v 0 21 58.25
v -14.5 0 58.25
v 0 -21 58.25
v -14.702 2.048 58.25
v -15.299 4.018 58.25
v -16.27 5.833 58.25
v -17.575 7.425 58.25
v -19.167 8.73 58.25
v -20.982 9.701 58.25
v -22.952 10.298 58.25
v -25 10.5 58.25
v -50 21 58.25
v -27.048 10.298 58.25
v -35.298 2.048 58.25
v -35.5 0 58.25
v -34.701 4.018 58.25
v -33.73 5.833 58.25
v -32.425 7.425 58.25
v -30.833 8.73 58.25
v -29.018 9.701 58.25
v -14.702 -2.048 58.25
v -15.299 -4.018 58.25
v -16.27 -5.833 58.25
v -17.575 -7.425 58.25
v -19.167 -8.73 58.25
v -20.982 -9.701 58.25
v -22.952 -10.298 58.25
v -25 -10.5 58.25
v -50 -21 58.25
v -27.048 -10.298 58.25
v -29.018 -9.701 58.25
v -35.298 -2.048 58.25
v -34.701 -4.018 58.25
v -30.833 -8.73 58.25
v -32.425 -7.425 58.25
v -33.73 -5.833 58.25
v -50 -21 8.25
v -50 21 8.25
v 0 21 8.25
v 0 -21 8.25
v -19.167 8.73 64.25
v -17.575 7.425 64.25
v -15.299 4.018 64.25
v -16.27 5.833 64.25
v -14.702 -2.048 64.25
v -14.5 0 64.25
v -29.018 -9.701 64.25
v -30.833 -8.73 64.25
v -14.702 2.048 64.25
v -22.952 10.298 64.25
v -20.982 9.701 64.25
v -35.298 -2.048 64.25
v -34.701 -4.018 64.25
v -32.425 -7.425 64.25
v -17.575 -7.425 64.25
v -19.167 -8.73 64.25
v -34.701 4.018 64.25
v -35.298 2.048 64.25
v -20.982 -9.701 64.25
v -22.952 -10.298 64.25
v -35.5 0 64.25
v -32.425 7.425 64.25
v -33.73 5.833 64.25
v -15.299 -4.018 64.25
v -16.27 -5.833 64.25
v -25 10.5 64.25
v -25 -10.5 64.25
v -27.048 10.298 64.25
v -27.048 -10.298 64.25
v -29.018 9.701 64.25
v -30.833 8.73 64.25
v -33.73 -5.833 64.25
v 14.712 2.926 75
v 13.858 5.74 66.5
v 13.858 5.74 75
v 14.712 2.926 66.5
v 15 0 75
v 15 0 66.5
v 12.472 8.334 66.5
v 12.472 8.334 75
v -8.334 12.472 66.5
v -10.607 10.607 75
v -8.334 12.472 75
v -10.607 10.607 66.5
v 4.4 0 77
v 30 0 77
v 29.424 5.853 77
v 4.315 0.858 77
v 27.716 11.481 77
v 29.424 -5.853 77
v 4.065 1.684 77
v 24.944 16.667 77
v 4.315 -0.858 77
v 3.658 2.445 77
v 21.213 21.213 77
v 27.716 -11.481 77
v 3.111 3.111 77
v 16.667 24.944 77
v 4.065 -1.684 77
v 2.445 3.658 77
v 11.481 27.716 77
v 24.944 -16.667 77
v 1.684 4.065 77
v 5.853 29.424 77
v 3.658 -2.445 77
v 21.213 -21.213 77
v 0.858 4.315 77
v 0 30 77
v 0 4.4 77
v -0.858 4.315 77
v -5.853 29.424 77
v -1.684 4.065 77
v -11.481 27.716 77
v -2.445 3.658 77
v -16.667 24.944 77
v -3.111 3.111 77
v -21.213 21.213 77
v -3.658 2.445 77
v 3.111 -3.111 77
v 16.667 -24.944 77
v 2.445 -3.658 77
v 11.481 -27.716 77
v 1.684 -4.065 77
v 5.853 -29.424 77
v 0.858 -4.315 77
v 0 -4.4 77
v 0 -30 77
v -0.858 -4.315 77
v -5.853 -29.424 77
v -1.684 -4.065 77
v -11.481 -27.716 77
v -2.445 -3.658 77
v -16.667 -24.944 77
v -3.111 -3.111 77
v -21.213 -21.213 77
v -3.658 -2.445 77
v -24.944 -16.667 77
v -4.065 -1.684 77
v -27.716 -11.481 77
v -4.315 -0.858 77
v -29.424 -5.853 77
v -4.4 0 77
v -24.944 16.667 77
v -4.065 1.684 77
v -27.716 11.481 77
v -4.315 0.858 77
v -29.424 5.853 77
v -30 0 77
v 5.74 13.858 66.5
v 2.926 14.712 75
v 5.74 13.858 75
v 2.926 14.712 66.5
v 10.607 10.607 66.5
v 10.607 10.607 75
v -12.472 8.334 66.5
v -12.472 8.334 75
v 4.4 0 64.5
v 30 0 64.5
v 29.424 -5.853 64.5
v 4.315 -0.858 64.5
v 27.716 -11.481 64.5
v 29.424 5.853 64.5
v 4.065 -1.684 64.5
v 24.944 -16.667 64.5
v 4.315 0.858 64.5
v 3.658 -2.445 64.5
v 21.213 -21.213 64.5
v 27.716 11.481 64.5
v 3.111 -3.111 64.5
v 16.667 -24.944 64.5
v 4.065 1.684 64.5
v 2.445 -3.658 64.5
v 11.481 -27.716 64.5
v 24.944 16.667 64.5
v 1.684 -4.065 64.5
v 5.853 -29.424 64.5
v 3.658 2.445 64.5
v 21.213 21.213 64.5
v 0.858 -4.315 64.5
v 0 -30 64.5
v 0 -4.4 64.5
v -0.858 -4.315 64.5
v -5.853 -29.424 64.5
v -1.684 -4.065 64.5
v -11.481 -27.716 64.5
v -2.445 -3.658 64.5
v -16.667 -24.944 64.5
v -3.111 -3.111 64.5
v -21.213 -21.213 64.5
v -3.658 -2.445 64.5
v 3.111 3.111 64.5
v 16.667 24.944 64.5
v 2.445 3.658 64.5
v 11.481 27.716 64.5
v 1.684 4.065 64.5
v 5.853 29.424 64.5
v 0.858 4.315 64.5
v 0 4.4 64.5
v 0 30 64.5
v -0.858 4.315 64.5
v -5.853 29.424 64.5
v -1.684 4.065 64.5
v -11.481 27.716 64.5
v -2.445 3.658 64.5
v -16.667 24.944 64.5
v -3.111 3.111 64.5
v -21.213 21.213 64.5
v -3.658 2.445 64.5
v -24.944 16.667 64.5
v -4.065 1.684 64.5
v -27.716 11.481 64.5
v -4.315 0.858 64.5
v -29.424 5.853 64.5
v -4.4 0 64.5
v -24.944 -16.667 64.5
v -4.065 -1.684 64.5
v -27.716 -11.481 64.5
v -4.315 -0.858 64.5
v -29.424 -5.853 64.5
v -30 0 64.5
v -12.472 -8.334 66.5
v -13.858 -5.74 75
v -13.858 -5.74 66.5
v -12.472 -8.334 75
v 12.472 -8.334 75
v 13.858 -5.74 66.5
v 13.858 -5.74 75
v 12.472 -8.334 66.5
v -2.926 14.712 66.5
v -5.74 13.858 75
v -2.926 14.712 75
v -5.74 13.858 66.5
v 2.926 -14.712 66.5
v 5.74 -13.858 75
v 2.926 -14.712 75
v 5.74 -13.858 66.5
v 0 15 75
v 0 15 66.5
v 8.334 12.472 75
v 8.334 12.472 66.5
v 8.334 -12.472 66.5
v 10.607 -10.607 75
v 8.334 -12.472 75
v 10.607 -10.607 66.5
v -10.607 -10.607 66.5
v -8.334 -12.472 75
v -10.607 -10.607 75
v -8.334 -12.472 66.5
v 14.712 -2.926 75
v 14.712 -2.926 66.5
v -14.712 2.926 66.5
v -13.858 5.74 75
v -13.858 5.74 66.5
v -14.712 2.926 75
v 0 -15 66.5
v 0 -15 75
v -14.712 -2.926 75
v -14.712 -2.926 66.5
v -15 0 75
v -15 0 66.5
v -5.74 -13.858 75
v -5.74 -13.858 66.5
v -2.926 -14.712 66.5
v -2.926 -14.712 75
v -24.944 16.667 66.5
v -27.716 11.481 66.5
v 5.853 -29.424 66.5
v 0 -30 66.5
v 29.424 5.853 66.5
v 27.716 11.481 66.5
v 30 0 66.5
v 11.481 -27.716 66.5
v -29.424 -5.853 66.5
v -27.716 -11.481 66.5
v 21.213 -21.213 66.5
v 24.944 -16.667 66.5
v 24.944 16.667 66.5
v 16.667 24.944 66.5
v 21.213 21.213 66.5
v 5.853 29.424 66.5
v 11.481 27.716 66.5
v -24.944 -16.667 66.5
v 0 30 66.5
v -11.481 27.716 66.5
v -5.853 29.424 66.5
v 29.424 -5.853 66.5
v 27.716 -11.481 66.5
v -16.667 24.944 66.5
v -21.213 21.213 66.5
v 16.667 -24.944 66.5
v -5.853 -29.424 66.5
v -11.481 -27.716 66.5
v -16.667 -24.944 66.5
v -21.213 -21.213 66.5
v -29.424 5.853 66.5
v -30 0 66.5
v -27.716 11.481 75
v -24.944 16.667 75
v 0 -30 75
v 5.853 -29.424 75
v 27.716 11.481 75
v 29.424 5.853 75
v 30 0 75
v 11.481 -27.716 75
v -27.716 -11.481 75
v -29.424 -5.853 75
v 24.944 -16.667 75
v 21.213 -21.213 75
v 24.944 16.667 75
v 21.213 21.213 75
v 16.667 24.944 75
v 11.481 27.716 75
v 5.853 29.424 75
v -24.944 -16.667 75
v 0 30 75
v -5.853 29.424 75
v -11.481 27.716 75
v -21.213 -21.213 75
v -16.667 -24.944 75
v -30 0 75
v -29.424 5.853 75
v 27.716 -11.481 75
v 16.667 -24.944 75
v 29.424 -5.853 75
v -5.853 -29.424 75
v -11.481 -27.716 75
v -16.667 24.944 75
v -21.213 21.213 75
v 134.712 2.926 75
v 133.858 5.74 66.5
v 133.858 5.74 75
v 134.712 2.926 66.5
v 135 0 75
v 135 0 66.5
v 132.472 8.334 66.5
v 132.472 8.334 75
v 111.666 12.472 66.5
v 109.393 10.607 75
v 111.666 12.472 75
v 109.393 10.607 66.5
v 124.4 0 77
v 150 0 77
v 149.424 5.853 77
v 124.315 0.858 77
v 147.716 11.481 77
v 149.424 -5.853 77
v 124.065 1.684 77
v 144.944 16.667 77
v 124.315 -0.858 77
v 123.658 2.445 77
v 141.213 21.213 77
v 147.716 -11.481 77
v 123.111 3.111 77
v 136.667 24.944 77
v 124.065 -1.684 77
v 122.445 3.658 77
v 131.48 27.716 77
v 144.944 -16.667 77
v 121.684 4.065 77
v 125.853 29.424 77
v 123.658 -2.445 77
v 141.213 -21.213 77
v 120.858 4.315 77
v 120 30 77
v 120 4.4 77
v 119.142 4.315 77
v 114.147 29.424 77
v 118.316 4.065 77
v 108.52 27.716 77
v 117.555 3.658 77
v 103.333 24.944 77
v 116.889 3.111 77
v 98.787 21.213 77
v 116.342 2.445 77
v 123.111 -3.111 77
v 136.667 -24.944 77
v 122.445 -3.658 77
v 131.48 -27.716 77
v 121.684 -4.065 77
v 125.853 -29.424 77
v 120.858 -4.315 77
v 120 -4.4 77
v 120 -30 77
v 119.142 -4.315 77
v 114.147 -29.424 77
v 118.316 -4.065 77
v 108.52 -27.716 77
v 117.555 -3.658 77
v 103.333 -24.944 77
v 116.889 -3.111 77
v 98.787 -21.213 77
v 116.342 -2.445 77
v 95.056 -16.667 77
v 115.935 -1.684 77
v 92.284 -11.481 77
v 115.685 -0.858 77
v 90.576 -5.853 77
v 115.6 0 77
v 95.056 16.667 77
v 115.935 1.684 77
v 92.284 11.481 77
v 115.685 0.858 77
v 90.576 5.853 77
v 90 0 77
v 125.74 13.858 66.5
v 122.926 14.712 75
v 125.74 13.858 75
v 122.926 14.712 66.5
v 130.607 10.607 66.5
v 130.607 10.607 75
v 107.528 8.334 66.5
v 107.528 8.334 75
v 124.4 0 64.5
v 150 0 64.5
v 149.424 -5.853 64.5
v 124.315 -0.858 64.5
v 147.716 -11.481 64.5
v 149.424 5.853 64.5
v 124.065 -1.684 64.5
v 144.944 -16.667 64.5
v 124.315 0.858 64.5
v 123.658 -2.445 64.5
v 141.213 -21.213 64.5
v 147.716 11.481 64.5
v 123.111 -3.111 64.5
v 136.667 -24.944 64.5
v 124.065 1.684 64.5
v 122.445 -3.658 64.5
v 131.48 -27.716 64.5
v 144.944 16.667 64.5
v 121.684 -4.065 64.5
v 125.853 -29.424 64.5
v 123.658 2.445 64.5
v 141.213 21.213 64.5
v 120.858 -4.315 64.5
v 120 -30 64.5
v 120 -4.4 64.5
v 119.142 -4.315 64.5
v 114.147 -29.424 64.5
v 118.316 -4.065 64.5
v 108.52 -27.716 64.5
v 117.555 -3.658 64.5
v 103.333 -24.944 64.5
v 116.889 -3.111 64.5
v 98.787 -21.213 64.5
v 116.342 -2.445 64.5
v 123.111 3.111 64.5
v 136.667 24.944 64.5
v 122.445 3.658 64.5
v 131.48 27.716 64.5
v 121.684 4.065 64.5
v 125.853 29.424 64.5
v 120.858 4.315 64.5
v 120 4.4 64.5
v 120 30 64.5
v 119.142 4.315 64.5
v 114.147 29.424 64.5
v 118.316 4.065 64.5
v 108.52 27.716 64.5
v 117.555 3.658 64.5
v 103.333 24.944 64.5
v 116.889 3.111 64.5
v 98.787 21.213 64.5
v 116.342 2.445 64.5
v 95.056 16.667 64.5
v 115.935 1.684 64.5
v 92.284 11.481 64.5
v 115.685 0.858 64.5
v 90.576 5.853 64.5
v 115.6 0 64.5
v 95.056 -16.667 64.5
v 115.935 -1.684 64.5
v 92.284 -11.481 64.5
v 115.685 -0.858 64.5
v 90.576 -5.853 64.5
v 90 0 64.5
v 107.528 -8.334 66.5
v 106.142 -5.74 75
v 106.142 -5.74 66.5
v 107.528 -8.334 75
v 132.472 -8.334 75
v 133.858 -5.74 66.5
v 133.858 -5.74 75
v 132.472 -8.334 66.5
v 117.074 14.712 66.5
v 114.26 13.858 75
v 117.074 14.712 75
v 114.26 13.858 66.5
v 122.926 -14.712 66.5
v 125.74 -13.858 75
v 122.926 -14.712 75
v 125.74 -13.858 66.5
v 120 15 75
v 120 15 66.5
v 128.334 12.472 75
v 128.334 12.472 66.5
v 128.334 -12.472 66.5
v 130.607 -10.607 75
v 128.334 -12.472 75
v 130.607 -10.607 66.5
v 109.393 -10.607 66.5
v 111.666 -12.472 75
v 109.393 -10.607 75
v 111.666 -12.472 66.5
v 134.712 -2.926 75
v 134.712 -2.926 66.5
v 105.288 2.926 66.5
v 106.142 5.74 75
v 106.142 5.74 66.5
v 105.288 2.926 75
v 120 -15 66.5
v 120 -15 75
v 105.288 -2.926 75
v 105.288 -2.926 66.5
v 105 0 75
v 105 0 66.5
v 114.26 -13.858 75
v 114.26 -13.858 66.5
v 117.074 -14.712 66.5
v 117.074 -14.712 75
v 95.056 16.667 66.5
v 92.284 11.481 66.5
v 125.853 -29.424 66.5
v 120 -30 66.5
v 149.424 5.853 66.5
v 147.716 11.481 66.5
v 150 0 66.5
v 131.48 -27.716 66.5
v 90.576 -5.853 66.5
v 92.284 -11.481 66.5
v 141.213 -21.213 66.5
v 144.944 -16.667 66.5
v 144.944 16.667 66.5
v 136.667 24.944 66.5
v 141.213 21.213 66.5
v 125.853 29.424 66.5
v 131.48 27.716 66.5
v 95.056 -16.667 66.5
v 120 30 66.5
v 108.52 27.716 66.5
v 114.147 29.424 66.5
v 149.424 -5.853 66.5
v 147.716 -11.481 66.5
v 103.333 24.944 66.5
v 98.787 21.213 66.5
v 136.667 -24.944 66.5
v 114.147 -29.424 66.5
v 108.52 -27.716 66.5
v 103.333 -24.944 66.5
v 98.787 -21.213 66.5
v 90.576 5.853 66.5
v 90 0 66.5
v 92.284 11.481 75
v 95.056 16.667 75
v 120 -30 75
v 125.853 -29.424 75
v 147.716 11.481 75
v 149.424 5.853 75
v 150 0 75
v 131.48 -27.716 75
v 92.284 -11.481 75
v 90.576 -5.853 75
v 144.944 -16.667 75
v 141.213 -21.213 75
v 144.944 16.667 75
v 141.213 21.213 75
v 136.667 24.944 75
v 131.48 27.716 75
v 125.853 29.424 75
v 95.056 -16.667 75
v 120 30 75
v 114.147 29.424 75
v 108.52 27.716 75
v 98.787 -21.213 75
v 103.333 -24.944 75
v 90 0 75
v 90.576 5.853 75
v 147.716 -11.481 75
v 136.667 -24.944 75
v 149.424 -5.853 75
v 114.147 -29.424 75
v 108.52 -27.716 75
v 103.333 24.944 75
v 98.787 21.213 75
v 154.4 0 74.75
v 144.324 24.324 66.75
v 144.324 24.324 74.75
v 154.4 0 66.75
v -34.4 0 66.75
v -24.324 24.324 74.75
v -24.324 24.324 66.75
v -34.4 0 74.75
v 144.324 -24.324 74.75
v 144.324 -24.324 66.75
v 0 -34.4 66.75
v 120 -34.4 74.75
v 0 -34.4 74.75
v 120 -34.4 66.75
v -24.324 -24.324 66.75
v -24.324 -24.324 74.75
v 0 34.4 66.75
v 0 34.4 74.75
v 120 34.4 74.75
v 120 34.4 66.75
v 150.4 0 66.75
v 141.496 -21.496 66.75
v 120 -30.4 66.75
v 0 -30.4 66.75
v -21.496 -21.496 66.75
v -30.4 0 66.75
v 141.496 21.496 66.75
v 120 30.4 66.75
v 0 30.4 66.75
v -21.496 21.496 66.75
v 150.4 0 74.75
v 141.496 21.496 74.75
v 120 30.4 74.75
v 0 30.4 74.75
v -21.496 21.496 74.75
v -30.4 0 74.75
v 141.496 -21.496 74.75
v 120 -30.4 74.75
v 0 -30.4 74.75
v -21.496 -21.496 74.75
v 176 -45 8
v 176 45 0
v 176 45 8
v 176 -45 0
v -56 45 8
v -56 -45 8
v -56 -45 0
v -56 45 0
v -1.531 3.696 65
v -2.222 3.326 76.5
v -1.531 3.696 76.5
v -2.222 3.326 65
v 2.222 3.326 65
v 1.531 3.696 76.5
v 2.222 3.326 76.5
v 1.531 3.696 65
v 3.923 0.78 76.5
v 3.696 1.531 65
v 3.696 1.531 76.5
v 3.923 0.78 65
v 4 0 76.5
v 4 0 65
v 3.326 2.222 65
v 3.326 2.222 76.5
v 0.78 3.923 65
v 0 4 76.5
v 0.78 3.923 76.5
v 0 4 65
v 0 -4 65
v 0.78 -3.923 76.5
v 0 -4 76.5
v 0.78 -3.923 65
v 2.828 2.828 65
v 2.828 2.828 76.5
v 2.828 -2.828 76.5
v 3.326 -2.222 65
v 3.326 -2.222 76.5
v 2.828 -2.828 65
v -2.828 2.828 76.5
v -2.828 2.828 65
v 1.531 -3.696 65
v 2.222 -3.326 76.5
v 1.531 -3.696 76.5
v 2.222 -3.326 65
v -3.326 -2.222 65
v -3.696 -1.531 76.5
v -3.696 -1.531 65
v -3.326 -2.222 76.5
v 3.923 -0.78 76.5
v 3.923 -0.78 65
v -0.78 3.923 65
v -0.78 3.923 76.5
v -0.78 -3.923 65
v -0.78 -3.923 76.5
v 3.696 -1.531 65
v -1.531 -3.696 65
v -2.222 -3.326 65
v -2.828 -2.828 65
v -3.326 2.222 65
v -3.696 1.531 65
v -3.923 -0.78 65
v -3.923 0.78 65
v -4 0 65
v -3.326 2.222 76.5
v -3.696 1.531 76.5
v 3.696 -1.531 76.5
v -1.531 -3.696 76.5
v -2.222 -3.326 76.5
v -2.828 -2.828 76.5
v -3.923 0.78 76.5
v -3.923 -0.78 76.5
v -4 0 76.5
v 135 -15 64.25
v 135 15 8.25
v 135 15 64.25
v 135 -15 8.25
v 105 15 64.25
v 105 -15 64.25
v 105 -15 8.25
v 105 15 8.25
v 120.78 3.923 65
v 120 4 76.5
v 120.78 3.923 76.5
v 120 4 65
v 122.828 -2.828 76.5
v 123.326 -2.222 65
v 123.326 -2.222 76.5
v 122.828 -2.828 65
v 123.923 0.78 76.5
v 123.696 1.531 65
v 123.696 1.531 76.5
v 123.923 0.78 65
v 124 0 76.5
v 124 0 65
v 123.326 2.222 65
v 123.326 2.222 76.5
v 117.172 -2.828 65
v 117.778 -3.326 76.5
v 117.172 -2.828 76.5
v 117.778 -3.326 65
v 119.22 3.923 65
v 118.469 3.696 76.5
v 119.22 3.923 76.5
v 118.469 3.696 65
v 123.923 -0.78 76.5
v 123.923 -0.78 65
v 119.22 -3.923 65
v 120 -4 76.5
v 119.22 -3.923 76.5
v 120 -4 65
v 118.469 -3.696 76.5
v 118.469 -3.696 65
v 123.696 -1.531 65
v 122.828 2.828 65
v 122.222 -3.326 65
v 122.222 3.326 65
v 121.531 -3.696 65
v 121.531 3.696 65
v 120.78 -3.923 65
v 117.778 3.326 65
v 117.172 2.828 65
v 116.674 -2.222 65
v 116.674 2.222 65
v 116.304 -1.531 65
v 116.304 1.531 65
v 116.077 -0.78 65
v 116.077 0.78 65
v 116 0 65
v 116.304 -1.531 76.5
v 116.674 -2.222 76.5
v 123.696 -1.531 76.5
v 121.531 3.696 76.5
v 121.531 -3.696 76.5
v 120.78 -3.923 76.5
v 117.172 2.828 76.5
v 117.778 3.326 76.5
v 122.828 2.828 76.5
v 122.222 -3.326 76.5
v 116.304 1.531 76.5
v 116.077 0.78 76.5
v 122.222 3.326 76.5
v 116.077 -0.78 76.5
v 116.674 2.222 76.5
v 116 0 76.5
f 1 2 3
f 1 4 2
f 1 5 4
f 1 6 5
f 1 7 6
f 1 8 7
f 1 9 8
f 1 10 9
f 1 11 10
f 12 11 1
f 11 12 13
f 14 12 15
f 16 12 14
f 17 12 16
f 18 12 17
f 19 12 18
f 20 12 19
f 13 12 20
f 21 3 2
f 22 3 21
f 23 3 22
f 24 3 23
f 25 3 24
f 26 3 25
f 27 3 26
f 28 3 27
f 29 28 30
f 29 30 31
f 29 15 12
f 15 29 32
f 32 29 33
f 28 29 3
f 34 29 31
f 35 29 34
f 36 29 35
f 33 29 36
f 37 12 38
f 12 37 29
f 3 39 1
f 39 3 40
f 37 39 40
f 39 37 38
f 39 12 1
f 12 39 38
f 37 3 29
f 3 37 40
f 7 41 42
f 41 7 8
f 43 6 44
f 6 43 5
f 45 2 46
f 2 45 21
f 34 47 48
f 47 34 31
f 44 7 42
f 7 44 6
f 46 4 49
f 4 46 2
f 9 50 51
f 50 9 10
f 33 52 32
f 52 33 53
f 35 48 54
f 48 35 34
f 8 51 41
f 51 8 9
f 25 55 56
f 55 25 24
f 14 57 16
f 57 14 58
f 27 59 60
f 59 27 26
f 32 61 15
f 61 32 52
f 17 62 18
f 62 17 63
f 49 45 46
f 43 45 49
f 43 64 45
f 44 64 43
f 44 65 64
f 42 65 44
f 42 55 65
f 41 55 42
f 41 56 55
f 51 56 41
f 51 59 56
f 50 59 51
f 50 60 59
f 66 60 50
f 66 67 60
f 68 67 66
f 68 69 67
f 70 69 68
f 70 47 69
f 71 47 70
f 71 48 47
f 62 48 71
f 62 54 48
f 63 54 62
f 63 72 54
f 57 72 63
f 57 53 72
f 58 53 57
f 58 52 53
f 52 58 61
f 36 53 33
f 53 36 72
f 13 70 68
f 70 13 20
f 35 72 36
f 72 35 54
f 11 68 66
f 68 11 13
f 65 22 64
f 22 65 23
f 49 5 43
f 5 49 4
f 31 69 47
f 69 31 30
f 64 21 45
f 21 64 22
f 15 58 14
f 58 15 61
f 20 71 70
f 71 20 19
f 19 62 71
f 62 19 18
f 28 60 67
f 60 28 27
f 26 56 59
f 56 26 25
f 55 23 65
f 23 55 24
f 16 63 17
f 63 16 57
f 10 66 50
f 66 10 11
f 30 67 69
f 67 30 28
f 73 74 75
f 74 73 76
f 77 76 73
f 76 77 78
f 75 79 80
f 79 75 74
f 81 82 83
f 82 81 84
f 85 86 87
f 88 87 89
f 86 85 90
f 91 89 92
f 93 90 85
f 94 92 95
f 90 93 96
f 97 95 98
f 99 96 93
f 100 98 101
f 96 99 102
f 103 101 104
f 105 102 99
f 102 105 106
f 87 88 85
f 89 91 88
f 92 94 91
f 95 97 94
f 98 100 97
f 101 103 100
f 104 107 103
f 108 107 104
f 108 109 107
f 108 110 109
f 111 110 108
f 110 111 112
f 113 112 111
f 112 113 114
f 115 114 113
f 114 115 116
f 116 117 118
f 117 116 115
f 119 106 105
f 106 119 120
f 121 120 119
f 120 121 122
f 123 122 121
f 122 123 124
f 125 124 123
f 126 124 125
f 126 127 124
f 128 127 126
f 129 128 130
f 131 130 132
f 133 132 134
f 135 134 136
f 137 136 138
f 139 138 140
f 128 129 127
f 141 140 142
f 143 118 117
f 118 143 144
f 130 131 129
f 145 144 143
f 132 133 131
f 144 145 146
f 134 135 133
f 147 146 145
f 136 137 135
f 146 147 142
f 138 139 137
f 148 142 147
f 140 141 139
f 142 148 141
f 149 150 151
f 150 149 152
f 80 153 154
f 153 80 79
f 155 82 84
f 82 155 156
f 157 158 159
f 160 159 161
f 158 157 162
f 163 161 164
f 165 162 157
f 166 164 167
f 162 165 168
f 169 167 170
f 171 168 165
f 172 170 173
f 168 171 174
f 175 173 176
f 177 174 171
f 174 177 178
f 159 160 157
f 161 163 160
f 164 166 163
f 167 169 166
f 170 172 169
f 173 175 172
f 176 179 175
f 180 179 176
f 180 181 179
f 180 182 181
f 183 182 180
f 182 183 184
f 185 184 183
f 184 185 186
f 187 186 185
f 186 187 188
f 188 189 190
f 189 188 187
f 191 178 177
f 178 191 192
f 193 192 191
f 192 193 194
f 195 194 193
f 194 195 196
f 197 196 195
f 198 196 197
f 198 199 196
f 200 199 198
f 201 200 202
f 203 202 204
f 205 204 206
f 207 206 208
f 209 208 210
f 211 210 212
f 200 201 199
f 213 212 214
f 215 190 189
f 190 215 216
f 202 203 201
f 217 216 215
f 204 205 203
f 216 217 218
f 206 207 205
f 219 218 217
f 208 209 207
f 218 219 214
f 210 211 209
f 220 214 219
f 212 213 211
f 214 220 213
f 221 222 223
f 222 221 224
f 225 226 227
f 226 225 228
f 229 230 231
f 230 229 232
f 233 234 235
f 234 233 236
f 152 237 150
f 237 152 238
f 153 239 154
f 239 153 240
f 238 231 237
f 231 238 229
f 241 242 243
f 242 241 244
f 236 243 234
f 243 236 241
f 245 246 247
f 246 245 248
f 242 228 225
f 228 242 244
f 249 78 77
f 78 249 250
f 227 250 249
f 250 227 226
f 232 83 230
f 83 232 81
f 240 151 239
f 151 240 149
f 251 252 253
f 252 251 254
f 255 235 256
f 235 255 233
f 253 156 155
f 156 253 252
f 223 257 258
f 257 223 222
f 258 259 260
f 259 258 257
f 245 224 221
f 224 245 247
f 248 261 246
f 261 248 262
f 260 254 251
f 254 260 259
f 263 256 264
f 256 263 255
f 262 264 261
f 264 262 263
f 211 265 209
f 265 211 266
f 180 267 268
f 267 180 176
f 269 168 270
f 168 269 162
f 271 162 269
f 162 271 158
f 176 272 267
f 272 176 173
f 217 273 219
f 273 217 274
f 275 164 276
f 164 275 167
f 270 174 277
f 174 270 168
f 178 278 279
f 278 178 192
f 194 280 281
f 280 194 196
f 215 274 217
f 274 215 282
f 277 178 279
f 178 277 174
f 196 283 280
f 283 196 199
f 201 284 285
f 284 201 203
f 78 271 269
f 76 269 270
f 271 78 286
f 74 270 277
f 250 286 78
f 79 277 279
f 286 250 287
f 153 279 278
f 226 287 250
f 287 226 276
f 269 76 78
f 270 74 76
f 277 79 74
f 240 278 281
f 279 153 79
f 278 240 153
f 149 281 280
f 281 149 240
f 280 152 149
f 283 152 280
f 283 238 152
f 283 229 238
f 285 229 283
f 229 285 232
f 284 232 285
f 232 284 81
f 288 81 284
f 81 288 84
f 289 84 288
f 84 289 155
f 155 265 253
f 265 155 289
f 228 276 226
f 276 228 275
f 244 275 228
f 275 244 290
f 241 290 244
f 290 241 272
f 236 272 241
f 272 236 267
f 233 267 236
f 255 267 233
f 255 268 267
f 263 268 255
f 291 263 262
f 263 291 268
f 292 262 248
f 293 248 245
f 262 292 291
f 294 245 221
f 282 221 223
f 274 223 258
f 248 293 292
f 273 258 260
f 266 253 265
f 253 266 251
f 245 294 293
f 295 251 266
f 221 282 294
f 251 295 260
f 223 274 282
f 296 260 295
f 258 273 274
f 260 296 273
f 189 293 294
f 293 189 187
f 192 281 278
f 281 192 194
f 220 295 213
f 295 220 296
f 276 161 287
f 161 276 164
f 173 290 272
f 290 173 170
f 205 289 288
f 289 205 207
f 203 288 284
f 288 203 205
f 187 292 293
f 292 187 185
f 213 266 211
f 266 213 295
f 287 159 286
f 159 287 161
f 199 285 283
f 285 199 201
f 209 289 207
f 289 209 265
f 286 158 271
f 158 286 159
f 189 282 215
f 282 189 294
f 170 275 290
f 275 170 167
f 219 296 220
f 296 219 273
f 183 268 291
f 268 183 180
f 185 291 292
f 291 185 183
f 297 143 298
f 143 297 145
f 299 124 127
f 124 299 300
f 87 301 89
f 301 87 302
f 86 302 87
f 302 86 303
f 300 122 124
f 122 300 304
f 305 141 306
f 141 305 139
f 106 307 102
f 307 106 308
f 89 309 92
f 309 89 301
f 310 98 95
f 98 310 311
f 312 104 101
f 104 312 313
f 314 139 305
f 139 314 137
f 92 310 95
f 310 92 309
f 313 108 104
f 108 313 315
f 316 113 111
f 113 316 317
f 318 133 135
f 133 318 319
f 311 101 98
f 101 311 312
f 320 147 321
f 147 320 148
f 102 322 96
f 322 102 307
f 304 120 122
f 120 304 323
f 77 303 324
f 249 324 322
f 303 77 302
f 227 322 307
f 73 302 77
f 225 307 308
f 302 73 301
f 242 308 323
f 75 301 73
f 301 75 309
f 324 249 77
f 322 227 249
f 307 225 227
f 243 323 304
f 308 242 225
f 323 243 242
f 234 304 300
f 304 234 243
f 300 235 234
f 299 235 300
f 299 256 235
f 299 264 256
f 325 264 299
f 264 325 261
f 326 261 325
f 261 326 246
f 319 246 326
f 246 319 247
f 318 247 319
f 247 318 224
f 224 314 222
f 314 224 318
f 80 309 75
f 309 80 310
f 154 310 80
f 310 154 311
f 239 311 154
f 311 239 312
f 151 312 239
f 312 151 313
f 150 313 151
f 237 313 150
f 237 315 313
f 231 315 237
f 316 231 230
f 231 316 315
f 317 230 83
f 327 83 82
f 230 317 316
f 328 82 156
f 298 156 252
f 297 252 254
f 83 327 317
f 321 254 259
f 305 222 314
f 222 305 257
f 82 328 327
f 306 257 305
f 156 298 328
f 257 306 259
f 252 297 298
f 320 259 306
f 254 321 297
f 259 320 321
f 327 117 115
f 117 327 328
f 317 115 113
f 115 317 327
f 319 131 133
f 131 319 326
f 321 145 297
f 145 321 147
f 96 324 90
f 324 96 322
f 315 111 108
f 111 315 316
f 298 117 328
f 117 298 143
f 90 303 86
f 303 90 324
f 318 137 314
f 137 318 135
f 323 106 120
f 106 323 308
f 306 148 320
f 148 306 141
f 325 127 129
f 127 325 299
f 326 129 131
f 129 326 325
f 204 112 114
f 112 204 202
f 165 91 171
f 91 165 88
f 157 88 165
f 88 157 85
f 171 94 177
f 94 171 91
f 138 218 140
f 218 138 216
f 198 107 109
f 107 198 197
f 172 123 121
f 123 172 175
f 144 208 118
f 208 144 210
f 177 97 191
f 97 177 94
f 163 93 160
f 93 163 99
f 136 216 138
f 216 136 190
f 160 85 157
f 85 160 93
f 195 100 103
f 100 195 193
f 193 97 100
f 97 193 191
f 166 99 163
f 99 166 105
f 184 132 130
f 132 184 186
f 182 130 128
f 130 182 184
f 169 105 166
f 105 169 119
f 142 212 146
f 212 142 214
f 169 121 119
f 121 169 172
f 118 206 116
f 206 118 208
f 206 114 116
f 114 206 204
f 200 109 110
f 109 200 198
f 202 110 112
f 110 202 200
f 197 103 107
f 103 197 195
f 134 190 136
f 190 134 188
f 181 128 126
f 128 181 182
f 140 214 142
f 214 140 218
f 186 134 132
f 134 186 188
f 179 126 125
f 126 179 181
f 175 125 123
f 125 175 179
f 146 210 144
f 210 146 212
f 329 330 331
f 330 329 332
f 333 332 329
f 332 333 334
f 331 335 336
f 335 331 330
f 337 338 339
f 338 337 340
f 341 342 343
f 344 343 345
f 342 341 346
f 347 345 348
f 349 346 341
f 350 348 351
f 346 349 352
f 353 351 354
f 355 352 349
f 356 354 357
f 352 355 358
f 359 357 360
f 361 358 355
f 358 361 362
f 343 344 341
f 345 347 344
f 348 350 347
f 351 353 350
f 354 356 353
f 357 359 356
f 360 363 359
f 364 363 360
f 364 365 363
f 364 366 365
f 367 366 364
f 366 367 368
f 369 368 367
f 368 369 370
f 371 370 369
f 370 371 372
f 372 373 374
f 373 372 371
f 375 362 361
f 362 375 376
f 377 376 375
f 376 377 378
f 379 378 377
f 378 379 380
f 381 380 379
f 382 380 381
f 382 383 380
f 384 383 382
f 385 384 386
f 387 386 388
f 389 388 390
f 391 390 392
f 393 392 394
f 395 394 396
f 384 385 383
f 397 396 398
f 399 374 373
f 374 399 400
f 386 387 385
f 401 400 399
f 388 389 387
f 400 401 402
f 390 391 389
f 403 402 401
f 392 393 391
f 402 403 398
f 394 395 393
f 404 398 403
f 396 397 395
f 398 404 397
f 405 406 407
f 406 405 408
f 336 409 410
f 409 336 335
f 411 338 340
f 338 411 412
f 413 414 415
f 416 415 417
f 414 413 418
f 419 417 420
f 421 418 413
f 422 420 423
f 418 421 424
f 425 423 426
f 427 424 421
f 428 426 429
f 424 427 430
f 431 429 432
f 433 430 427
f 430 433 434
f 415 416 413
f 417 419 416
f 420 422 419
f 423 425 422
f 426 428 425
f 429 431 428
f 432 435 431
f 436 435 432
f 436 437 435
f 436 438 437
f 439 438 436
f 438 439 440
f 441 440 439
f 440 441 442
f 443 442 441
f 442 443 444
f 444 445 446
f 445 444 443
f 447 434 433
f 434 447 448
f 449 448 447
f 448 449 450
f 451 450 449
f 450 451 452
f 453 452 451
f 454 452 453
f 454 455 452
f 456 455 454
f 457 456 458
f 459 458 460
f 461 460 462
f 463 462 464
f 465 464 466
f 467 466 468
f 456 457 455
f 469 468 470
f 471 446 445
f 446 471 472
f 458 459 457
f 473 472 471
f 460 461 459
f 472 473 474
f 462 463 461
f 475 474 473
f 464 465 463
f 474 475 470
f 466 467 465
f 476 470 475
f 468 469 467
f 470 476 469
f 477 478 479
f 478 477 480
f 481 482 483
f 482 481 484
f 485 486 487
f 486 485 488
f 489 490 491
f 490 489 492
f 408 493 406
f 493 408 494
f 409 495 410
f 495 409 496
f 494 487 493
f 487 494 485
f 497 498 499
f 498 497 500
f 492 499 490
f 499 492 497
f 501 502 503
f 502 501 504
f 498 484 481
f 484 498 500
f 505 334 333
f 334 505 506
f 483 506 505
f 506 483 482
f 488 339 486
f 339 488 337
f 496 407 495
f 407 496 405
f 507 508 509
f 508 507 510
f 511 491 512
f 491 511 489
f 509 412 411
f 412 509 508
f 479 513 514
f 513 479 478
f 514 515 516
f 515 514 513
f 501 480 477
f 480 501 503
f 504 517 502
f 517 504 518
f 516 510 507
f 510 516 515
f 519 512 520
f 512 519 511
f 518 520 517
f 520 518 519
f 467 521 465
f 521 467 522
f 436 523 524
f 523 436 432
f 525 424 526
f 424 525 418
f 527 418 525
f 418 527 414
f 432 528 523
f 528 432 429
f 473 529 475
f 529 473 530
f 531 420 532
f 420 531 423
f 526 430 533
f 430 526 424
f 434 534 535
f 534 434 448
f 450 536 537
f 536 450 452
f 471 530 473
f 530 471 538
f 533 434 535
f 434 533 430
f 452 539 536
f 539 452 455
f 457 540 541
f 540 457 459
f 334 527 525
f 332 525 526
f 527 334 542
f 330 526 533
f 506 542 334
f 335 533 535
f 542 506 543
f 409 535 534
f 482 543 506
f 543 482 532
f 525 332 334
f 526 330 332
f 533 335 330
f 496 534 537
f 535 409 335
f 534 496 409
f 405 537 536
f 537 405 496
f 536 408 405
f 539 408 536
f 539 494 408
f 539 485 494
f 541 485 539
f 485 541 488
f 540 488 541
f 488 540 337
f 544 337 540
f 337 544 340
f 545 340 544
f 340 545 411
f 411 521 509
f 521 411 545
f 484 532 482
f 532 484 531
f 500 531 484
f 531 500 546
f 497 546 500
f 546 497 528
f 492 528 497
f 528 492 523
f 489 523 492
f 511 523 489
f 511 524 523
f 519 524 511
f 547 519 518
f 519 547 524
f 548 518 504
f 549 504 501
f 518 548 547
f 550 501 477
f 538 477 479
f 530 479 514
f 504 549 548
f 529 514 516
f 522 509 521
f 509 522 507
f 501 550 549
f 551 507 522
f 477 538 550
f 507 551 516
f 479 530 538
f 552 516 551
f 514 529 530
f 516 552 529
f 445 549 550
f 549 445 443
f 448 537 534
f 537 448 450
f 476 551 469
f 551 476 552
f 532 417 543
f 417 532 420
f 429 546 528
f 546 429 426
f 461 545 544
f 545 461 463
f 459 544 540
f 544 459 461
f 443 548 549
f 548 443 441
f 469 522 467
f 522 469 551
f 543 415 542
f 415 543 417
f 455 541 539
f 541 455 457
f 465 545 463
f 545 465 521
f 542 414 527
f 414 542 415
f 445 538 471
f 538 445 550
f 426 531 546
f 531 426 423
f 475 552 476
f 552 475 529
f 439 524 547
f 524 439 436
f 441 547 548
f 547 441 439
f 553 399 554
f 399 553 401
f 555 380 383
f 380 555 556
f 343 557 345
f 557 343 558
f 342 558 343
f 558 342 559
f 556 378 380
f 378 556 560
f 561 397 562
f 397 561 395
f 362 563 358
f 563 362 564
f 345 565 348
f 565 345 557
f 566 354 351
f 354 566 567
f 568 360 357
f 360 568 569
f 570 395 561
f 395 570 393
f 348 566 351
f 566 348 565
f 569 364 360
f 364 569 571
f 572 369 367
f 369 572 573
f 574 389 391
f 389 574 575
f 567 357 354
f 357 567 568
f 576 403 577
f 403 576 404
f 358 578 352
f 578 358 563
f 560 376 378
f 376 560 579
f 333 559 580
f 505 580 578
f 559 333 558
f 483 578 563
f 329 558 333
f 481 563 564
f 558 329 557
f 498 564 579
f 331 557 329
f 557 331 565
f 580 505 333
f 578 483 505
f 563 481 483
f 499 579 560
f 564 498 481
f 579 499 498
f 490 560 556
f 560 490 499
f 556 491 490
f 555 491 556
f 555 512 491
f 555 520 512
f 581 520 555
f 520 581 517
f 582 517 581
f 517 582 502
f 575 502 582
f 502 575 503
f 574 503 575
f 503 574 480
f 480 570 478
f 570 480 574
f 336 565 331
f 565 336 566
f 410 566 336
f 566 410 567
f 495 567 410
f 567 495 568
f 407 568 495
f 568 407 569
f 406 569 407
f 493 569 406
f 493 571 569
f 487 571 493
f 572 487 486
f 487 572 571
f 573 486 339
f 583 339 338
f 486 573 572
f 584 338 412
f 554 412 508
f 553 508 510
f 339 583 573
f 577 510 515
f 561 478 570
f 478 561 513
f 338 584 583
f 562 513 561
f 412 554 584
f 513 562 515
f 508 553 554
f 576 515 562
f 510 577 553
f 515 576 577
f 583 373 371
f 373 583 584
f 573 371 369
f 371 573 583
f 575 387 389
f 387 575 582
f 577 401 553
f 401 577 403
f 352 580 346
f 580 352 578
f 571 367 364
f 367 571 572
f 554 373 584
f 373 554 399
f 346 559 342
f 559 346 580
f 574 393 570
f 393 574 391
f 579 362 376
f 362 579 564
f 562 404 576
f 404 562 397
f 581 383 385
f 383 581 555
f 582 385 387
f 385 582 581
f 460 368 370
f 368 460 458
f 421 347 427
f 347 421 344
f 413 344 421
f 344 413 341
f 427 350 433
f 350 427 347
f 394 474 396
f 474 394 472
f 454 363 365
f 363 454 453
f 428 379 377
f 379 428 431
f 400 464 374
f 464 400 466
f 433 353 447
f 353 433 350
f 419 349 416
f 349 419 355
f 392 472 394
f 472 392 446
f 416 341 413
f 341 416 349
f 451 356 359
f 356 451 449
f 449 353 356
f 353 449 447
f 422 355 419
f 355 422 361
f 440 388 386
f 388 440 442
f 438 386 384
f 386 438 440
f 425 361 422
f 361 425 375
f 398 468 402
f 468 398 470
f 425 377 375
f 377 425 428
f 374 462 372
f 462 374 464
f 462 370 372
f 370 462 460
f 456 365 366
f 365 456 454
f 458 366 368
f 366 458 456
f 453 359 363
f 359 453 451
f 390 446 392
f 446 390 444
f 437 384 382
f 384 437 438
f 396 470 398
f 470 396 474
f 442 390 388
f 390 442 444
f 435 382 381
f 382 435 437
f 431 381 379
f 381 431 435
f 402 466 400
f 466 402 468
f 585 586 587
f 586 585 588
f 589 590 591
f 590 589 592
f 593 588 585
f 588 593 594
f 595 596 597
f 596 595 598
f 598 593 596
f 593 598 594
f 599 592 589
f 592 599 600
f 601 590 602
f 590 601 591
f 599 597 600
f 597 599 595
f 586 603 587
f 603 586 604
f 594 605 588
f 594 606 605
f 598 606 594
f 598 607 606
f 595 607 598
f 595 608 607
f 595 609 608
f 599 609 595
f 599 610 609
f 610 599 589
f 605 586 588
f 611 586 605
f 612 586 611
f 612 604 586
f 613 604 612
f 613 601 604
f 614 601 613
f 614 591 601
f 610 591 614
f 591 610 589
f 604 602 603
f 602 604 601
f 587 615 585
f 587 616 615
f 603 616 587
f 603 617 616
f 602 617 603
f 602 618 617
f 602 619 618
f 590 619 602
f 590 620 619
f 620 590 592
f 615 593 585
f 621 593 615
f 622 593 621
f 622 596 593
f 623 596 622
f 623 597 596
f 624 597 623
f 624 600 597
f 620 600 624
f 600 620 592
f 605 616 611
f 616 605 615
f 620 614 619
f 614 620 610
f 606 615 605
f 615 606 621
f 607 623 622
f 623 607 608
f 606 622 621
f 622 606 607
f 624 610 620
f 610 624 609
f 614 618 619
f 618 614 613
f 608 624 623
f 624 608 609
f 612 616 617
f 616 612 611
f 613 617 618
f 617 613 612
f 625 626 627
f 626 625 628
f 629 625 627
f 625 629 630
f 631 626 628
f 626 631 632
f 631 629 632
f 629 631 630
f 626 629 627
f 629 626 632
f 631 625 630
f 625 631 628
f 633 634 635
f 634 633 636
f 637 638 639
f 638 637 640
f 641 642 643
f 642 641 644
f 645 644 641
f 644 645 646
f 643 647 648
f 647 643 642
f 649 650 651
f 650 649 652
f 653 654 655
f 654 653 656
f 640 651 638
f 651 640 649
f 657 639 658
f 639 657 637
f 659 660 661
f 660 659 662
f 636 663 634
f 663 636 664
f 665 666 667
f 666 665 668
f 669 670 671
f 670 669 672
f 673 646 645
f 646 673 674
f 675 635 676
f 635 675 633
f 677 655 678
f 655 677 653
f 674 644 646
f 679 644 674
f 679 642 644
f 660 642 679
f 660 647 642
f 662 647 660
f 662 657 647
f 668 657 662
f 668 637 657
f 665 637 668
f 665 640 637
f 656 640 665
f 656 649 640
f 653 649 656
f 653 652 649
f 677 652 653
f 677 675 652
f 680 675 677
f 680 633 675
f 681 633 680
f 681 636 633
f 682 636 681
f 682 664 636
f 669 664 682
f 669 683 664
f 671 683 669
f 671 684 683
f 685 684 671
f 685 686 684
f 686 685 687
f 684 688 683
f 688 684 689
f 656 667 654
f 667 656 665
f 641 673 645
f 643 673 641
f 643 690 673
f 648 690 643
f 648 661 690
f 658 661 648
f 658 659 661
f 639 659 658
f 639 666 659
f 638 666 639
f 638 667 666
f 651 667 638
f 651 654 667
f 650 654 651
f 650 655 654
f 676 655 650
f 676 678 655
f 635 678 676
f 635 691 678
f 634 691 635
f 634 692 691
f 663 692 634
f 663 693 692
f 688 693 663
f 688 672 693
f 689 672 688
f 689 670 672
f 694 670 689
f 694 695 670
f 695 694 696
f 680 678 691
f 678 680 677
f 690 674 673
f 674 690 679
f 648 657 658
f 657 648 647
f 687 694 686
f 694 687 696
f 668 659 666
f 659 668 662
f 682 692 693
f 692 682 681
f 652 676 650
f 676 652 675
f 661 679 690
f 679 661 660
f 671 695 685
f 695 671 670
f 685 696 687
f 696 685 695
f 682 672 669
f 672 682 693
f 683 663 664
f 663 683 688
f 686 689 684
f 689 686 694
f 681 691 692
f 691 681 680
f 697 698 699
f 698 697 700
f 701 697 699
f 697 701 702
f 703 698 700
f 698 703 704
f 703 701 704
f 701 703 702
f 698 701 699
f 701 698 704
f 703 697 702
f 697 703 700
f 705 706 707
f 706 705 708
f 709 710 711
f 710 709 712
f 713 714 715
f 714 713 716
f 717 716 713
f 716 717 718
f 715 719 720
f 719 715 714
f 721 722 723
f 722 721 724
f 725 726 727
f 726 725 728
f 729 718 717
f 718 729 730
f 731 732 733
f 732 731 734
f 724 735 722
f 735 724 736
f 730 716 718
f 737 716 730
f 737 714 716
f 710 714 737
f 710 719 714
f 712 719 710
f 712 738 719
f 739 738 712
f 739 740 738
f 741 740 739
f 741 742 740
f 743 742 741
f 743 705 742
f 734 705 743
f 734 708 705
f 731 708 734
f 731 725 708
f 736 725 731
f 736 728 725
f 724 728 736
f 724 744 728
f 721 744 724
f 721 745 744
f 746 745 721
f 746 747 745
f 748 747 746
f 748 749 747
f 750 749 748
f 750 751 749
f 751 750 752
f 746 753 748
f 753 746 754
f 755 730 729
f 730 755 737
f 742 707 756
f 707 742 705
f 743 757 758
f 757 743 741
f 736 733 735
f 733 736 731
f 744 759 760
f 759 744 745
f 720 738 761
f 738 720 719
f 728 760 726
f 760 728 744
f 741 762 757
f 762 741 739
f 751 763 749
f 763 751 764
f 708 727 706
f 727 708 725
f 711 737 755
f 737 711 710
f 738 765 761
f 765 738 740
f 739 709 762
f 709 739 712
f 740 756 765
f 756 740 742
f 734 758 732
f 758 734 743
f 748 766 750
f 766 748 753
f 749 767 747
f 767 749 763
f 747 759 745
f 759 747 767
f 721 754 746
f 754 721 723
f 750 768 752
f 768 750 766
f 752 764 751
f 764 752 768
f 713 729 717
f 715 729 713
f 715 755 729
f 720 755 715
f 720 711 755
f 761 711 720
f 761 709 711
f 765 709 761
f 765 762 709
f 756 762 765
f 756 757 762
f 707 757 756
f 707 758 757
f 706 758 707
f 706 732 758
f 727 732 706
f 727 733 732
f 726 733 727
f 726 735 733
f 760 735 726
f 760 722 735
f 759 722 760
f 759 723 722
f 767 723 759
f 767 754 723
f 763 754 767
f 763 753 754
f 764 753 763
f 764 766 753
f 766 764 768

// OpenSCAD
$fn = 32;

// ------------------------------------------------------------------------
// Motor belt drive: span 120 mm, pulleys d60, belt 8 mm wide
// Every part is its own module, assembly() places every instance.
// ------------------------------------------------------------------------

// --- part 1 ---
module base_plate() {
  difference() {
    translate([-116, -45, 0]) cube([232, 90, 8]);
  }
}

// --- part 2 ---
module motor() {
  union() {
    translate([-25, -21, 0]) cube([50, 42, 50]);
    translate([28, 0, 25]) rotate([0, 90, 0]) cylinder(h = 6, d = 21, center = true);
  }
}

// --- part 3 ---
module drive_shaft() {
  translate([0, 0, -5.75]) cylinder(h = 11.5, d = 8);
}

// --- part 4 ---
module pulley_drive() {
  difference() {
    union() {
      cylinder(h = 12.5, d = 30);
      cylinder(h = 2, d = 60);
      translate([0, 0, 10.5]) cylinder(h = 2, d = 60);
    }
    translate([0, 0, -1]) cylinder(h = 14.5, d = 8.8);
  }
}

// --- part 5 ---
module idler_post() {
  translate([-15, -15, 0]) cube([30, 30, 56]);
}

// --- part 6 ---
module driven_shaft() {
  translate([0, 0, -5.75]) cylinder(h = 11.5, d = 8);
}

// --- part 7 ---
module pulley_driven() {
  difference() {
    union() {
      cylinder(h = 12.5, d = 30);
      cylinder(h = 2, d = 60);
      translate([0, 0, 10.5]) cylinder(h = 2, d = 60);
    }
    translate([0, 0, -1]) cylinder(h = 14.5, d = 8.8);
  }
}

// --- part 8 ---
module drive_belt() {
  difference() {
    linear_extrude(height = 8) polygon(points = concat([for (a = [90 : 45 : 270]) [34.4 * cos(a), 34.4 * sin(a)]], [for (a = [270 : 45 : 450]) [120 + 34.4 * cos(a), 34.4 * sin(a)]]));
    translate([0, 0, -1]) linear_extrude(height = 10) polygon(points = concat([for (a = [90 : 45 : 270]) [30.4 * cos(a), 30.4 * sin(a)]], [for (a = [270 : 45 : 450]) [120 + 30.4 * cos(a), 30.4 * sin(a)]]));
  }
}

// --- assembly ---
module assembly() {
  color([0.80, 0.24, 0.20]) translate([60, 0, 0]) rotate([0, 0, 0]) base_plate();
  color([0.20, 0.45, 0.75]) translate([0, 0, 33.25]) rotate([0, 270, 0]) motor();
  color([0.25, 0.62, 0.32]) translate([0, 0, 70.75]) rotate([0, 0, 0]) drive_shaft();
  color([0.92, 0.70, 0.18]) translate([0, 0, 64.5]) rotate([0, 0, 0]) pulley_drive();
  color([0.58, 0.35, 0.70]) translate([120, 0, 8.25]) rotate([0, 0, 0]) idler_post();
  color([0.16, 0.66, 0.66]) translate([120, 0, 70.75]) rotate([0, 0, 0]) driven_shaft();
  color([0.85, 0.48, 0.18]) translate([120, 0, 64.5]) rotate([0, 0, 0]) pulley_driven();
  color([0.55, 0.60, 0.65]) translate([0, 0, 66.75]) rotate([0, 0, 0]) drive_belt();
}

assembly();
